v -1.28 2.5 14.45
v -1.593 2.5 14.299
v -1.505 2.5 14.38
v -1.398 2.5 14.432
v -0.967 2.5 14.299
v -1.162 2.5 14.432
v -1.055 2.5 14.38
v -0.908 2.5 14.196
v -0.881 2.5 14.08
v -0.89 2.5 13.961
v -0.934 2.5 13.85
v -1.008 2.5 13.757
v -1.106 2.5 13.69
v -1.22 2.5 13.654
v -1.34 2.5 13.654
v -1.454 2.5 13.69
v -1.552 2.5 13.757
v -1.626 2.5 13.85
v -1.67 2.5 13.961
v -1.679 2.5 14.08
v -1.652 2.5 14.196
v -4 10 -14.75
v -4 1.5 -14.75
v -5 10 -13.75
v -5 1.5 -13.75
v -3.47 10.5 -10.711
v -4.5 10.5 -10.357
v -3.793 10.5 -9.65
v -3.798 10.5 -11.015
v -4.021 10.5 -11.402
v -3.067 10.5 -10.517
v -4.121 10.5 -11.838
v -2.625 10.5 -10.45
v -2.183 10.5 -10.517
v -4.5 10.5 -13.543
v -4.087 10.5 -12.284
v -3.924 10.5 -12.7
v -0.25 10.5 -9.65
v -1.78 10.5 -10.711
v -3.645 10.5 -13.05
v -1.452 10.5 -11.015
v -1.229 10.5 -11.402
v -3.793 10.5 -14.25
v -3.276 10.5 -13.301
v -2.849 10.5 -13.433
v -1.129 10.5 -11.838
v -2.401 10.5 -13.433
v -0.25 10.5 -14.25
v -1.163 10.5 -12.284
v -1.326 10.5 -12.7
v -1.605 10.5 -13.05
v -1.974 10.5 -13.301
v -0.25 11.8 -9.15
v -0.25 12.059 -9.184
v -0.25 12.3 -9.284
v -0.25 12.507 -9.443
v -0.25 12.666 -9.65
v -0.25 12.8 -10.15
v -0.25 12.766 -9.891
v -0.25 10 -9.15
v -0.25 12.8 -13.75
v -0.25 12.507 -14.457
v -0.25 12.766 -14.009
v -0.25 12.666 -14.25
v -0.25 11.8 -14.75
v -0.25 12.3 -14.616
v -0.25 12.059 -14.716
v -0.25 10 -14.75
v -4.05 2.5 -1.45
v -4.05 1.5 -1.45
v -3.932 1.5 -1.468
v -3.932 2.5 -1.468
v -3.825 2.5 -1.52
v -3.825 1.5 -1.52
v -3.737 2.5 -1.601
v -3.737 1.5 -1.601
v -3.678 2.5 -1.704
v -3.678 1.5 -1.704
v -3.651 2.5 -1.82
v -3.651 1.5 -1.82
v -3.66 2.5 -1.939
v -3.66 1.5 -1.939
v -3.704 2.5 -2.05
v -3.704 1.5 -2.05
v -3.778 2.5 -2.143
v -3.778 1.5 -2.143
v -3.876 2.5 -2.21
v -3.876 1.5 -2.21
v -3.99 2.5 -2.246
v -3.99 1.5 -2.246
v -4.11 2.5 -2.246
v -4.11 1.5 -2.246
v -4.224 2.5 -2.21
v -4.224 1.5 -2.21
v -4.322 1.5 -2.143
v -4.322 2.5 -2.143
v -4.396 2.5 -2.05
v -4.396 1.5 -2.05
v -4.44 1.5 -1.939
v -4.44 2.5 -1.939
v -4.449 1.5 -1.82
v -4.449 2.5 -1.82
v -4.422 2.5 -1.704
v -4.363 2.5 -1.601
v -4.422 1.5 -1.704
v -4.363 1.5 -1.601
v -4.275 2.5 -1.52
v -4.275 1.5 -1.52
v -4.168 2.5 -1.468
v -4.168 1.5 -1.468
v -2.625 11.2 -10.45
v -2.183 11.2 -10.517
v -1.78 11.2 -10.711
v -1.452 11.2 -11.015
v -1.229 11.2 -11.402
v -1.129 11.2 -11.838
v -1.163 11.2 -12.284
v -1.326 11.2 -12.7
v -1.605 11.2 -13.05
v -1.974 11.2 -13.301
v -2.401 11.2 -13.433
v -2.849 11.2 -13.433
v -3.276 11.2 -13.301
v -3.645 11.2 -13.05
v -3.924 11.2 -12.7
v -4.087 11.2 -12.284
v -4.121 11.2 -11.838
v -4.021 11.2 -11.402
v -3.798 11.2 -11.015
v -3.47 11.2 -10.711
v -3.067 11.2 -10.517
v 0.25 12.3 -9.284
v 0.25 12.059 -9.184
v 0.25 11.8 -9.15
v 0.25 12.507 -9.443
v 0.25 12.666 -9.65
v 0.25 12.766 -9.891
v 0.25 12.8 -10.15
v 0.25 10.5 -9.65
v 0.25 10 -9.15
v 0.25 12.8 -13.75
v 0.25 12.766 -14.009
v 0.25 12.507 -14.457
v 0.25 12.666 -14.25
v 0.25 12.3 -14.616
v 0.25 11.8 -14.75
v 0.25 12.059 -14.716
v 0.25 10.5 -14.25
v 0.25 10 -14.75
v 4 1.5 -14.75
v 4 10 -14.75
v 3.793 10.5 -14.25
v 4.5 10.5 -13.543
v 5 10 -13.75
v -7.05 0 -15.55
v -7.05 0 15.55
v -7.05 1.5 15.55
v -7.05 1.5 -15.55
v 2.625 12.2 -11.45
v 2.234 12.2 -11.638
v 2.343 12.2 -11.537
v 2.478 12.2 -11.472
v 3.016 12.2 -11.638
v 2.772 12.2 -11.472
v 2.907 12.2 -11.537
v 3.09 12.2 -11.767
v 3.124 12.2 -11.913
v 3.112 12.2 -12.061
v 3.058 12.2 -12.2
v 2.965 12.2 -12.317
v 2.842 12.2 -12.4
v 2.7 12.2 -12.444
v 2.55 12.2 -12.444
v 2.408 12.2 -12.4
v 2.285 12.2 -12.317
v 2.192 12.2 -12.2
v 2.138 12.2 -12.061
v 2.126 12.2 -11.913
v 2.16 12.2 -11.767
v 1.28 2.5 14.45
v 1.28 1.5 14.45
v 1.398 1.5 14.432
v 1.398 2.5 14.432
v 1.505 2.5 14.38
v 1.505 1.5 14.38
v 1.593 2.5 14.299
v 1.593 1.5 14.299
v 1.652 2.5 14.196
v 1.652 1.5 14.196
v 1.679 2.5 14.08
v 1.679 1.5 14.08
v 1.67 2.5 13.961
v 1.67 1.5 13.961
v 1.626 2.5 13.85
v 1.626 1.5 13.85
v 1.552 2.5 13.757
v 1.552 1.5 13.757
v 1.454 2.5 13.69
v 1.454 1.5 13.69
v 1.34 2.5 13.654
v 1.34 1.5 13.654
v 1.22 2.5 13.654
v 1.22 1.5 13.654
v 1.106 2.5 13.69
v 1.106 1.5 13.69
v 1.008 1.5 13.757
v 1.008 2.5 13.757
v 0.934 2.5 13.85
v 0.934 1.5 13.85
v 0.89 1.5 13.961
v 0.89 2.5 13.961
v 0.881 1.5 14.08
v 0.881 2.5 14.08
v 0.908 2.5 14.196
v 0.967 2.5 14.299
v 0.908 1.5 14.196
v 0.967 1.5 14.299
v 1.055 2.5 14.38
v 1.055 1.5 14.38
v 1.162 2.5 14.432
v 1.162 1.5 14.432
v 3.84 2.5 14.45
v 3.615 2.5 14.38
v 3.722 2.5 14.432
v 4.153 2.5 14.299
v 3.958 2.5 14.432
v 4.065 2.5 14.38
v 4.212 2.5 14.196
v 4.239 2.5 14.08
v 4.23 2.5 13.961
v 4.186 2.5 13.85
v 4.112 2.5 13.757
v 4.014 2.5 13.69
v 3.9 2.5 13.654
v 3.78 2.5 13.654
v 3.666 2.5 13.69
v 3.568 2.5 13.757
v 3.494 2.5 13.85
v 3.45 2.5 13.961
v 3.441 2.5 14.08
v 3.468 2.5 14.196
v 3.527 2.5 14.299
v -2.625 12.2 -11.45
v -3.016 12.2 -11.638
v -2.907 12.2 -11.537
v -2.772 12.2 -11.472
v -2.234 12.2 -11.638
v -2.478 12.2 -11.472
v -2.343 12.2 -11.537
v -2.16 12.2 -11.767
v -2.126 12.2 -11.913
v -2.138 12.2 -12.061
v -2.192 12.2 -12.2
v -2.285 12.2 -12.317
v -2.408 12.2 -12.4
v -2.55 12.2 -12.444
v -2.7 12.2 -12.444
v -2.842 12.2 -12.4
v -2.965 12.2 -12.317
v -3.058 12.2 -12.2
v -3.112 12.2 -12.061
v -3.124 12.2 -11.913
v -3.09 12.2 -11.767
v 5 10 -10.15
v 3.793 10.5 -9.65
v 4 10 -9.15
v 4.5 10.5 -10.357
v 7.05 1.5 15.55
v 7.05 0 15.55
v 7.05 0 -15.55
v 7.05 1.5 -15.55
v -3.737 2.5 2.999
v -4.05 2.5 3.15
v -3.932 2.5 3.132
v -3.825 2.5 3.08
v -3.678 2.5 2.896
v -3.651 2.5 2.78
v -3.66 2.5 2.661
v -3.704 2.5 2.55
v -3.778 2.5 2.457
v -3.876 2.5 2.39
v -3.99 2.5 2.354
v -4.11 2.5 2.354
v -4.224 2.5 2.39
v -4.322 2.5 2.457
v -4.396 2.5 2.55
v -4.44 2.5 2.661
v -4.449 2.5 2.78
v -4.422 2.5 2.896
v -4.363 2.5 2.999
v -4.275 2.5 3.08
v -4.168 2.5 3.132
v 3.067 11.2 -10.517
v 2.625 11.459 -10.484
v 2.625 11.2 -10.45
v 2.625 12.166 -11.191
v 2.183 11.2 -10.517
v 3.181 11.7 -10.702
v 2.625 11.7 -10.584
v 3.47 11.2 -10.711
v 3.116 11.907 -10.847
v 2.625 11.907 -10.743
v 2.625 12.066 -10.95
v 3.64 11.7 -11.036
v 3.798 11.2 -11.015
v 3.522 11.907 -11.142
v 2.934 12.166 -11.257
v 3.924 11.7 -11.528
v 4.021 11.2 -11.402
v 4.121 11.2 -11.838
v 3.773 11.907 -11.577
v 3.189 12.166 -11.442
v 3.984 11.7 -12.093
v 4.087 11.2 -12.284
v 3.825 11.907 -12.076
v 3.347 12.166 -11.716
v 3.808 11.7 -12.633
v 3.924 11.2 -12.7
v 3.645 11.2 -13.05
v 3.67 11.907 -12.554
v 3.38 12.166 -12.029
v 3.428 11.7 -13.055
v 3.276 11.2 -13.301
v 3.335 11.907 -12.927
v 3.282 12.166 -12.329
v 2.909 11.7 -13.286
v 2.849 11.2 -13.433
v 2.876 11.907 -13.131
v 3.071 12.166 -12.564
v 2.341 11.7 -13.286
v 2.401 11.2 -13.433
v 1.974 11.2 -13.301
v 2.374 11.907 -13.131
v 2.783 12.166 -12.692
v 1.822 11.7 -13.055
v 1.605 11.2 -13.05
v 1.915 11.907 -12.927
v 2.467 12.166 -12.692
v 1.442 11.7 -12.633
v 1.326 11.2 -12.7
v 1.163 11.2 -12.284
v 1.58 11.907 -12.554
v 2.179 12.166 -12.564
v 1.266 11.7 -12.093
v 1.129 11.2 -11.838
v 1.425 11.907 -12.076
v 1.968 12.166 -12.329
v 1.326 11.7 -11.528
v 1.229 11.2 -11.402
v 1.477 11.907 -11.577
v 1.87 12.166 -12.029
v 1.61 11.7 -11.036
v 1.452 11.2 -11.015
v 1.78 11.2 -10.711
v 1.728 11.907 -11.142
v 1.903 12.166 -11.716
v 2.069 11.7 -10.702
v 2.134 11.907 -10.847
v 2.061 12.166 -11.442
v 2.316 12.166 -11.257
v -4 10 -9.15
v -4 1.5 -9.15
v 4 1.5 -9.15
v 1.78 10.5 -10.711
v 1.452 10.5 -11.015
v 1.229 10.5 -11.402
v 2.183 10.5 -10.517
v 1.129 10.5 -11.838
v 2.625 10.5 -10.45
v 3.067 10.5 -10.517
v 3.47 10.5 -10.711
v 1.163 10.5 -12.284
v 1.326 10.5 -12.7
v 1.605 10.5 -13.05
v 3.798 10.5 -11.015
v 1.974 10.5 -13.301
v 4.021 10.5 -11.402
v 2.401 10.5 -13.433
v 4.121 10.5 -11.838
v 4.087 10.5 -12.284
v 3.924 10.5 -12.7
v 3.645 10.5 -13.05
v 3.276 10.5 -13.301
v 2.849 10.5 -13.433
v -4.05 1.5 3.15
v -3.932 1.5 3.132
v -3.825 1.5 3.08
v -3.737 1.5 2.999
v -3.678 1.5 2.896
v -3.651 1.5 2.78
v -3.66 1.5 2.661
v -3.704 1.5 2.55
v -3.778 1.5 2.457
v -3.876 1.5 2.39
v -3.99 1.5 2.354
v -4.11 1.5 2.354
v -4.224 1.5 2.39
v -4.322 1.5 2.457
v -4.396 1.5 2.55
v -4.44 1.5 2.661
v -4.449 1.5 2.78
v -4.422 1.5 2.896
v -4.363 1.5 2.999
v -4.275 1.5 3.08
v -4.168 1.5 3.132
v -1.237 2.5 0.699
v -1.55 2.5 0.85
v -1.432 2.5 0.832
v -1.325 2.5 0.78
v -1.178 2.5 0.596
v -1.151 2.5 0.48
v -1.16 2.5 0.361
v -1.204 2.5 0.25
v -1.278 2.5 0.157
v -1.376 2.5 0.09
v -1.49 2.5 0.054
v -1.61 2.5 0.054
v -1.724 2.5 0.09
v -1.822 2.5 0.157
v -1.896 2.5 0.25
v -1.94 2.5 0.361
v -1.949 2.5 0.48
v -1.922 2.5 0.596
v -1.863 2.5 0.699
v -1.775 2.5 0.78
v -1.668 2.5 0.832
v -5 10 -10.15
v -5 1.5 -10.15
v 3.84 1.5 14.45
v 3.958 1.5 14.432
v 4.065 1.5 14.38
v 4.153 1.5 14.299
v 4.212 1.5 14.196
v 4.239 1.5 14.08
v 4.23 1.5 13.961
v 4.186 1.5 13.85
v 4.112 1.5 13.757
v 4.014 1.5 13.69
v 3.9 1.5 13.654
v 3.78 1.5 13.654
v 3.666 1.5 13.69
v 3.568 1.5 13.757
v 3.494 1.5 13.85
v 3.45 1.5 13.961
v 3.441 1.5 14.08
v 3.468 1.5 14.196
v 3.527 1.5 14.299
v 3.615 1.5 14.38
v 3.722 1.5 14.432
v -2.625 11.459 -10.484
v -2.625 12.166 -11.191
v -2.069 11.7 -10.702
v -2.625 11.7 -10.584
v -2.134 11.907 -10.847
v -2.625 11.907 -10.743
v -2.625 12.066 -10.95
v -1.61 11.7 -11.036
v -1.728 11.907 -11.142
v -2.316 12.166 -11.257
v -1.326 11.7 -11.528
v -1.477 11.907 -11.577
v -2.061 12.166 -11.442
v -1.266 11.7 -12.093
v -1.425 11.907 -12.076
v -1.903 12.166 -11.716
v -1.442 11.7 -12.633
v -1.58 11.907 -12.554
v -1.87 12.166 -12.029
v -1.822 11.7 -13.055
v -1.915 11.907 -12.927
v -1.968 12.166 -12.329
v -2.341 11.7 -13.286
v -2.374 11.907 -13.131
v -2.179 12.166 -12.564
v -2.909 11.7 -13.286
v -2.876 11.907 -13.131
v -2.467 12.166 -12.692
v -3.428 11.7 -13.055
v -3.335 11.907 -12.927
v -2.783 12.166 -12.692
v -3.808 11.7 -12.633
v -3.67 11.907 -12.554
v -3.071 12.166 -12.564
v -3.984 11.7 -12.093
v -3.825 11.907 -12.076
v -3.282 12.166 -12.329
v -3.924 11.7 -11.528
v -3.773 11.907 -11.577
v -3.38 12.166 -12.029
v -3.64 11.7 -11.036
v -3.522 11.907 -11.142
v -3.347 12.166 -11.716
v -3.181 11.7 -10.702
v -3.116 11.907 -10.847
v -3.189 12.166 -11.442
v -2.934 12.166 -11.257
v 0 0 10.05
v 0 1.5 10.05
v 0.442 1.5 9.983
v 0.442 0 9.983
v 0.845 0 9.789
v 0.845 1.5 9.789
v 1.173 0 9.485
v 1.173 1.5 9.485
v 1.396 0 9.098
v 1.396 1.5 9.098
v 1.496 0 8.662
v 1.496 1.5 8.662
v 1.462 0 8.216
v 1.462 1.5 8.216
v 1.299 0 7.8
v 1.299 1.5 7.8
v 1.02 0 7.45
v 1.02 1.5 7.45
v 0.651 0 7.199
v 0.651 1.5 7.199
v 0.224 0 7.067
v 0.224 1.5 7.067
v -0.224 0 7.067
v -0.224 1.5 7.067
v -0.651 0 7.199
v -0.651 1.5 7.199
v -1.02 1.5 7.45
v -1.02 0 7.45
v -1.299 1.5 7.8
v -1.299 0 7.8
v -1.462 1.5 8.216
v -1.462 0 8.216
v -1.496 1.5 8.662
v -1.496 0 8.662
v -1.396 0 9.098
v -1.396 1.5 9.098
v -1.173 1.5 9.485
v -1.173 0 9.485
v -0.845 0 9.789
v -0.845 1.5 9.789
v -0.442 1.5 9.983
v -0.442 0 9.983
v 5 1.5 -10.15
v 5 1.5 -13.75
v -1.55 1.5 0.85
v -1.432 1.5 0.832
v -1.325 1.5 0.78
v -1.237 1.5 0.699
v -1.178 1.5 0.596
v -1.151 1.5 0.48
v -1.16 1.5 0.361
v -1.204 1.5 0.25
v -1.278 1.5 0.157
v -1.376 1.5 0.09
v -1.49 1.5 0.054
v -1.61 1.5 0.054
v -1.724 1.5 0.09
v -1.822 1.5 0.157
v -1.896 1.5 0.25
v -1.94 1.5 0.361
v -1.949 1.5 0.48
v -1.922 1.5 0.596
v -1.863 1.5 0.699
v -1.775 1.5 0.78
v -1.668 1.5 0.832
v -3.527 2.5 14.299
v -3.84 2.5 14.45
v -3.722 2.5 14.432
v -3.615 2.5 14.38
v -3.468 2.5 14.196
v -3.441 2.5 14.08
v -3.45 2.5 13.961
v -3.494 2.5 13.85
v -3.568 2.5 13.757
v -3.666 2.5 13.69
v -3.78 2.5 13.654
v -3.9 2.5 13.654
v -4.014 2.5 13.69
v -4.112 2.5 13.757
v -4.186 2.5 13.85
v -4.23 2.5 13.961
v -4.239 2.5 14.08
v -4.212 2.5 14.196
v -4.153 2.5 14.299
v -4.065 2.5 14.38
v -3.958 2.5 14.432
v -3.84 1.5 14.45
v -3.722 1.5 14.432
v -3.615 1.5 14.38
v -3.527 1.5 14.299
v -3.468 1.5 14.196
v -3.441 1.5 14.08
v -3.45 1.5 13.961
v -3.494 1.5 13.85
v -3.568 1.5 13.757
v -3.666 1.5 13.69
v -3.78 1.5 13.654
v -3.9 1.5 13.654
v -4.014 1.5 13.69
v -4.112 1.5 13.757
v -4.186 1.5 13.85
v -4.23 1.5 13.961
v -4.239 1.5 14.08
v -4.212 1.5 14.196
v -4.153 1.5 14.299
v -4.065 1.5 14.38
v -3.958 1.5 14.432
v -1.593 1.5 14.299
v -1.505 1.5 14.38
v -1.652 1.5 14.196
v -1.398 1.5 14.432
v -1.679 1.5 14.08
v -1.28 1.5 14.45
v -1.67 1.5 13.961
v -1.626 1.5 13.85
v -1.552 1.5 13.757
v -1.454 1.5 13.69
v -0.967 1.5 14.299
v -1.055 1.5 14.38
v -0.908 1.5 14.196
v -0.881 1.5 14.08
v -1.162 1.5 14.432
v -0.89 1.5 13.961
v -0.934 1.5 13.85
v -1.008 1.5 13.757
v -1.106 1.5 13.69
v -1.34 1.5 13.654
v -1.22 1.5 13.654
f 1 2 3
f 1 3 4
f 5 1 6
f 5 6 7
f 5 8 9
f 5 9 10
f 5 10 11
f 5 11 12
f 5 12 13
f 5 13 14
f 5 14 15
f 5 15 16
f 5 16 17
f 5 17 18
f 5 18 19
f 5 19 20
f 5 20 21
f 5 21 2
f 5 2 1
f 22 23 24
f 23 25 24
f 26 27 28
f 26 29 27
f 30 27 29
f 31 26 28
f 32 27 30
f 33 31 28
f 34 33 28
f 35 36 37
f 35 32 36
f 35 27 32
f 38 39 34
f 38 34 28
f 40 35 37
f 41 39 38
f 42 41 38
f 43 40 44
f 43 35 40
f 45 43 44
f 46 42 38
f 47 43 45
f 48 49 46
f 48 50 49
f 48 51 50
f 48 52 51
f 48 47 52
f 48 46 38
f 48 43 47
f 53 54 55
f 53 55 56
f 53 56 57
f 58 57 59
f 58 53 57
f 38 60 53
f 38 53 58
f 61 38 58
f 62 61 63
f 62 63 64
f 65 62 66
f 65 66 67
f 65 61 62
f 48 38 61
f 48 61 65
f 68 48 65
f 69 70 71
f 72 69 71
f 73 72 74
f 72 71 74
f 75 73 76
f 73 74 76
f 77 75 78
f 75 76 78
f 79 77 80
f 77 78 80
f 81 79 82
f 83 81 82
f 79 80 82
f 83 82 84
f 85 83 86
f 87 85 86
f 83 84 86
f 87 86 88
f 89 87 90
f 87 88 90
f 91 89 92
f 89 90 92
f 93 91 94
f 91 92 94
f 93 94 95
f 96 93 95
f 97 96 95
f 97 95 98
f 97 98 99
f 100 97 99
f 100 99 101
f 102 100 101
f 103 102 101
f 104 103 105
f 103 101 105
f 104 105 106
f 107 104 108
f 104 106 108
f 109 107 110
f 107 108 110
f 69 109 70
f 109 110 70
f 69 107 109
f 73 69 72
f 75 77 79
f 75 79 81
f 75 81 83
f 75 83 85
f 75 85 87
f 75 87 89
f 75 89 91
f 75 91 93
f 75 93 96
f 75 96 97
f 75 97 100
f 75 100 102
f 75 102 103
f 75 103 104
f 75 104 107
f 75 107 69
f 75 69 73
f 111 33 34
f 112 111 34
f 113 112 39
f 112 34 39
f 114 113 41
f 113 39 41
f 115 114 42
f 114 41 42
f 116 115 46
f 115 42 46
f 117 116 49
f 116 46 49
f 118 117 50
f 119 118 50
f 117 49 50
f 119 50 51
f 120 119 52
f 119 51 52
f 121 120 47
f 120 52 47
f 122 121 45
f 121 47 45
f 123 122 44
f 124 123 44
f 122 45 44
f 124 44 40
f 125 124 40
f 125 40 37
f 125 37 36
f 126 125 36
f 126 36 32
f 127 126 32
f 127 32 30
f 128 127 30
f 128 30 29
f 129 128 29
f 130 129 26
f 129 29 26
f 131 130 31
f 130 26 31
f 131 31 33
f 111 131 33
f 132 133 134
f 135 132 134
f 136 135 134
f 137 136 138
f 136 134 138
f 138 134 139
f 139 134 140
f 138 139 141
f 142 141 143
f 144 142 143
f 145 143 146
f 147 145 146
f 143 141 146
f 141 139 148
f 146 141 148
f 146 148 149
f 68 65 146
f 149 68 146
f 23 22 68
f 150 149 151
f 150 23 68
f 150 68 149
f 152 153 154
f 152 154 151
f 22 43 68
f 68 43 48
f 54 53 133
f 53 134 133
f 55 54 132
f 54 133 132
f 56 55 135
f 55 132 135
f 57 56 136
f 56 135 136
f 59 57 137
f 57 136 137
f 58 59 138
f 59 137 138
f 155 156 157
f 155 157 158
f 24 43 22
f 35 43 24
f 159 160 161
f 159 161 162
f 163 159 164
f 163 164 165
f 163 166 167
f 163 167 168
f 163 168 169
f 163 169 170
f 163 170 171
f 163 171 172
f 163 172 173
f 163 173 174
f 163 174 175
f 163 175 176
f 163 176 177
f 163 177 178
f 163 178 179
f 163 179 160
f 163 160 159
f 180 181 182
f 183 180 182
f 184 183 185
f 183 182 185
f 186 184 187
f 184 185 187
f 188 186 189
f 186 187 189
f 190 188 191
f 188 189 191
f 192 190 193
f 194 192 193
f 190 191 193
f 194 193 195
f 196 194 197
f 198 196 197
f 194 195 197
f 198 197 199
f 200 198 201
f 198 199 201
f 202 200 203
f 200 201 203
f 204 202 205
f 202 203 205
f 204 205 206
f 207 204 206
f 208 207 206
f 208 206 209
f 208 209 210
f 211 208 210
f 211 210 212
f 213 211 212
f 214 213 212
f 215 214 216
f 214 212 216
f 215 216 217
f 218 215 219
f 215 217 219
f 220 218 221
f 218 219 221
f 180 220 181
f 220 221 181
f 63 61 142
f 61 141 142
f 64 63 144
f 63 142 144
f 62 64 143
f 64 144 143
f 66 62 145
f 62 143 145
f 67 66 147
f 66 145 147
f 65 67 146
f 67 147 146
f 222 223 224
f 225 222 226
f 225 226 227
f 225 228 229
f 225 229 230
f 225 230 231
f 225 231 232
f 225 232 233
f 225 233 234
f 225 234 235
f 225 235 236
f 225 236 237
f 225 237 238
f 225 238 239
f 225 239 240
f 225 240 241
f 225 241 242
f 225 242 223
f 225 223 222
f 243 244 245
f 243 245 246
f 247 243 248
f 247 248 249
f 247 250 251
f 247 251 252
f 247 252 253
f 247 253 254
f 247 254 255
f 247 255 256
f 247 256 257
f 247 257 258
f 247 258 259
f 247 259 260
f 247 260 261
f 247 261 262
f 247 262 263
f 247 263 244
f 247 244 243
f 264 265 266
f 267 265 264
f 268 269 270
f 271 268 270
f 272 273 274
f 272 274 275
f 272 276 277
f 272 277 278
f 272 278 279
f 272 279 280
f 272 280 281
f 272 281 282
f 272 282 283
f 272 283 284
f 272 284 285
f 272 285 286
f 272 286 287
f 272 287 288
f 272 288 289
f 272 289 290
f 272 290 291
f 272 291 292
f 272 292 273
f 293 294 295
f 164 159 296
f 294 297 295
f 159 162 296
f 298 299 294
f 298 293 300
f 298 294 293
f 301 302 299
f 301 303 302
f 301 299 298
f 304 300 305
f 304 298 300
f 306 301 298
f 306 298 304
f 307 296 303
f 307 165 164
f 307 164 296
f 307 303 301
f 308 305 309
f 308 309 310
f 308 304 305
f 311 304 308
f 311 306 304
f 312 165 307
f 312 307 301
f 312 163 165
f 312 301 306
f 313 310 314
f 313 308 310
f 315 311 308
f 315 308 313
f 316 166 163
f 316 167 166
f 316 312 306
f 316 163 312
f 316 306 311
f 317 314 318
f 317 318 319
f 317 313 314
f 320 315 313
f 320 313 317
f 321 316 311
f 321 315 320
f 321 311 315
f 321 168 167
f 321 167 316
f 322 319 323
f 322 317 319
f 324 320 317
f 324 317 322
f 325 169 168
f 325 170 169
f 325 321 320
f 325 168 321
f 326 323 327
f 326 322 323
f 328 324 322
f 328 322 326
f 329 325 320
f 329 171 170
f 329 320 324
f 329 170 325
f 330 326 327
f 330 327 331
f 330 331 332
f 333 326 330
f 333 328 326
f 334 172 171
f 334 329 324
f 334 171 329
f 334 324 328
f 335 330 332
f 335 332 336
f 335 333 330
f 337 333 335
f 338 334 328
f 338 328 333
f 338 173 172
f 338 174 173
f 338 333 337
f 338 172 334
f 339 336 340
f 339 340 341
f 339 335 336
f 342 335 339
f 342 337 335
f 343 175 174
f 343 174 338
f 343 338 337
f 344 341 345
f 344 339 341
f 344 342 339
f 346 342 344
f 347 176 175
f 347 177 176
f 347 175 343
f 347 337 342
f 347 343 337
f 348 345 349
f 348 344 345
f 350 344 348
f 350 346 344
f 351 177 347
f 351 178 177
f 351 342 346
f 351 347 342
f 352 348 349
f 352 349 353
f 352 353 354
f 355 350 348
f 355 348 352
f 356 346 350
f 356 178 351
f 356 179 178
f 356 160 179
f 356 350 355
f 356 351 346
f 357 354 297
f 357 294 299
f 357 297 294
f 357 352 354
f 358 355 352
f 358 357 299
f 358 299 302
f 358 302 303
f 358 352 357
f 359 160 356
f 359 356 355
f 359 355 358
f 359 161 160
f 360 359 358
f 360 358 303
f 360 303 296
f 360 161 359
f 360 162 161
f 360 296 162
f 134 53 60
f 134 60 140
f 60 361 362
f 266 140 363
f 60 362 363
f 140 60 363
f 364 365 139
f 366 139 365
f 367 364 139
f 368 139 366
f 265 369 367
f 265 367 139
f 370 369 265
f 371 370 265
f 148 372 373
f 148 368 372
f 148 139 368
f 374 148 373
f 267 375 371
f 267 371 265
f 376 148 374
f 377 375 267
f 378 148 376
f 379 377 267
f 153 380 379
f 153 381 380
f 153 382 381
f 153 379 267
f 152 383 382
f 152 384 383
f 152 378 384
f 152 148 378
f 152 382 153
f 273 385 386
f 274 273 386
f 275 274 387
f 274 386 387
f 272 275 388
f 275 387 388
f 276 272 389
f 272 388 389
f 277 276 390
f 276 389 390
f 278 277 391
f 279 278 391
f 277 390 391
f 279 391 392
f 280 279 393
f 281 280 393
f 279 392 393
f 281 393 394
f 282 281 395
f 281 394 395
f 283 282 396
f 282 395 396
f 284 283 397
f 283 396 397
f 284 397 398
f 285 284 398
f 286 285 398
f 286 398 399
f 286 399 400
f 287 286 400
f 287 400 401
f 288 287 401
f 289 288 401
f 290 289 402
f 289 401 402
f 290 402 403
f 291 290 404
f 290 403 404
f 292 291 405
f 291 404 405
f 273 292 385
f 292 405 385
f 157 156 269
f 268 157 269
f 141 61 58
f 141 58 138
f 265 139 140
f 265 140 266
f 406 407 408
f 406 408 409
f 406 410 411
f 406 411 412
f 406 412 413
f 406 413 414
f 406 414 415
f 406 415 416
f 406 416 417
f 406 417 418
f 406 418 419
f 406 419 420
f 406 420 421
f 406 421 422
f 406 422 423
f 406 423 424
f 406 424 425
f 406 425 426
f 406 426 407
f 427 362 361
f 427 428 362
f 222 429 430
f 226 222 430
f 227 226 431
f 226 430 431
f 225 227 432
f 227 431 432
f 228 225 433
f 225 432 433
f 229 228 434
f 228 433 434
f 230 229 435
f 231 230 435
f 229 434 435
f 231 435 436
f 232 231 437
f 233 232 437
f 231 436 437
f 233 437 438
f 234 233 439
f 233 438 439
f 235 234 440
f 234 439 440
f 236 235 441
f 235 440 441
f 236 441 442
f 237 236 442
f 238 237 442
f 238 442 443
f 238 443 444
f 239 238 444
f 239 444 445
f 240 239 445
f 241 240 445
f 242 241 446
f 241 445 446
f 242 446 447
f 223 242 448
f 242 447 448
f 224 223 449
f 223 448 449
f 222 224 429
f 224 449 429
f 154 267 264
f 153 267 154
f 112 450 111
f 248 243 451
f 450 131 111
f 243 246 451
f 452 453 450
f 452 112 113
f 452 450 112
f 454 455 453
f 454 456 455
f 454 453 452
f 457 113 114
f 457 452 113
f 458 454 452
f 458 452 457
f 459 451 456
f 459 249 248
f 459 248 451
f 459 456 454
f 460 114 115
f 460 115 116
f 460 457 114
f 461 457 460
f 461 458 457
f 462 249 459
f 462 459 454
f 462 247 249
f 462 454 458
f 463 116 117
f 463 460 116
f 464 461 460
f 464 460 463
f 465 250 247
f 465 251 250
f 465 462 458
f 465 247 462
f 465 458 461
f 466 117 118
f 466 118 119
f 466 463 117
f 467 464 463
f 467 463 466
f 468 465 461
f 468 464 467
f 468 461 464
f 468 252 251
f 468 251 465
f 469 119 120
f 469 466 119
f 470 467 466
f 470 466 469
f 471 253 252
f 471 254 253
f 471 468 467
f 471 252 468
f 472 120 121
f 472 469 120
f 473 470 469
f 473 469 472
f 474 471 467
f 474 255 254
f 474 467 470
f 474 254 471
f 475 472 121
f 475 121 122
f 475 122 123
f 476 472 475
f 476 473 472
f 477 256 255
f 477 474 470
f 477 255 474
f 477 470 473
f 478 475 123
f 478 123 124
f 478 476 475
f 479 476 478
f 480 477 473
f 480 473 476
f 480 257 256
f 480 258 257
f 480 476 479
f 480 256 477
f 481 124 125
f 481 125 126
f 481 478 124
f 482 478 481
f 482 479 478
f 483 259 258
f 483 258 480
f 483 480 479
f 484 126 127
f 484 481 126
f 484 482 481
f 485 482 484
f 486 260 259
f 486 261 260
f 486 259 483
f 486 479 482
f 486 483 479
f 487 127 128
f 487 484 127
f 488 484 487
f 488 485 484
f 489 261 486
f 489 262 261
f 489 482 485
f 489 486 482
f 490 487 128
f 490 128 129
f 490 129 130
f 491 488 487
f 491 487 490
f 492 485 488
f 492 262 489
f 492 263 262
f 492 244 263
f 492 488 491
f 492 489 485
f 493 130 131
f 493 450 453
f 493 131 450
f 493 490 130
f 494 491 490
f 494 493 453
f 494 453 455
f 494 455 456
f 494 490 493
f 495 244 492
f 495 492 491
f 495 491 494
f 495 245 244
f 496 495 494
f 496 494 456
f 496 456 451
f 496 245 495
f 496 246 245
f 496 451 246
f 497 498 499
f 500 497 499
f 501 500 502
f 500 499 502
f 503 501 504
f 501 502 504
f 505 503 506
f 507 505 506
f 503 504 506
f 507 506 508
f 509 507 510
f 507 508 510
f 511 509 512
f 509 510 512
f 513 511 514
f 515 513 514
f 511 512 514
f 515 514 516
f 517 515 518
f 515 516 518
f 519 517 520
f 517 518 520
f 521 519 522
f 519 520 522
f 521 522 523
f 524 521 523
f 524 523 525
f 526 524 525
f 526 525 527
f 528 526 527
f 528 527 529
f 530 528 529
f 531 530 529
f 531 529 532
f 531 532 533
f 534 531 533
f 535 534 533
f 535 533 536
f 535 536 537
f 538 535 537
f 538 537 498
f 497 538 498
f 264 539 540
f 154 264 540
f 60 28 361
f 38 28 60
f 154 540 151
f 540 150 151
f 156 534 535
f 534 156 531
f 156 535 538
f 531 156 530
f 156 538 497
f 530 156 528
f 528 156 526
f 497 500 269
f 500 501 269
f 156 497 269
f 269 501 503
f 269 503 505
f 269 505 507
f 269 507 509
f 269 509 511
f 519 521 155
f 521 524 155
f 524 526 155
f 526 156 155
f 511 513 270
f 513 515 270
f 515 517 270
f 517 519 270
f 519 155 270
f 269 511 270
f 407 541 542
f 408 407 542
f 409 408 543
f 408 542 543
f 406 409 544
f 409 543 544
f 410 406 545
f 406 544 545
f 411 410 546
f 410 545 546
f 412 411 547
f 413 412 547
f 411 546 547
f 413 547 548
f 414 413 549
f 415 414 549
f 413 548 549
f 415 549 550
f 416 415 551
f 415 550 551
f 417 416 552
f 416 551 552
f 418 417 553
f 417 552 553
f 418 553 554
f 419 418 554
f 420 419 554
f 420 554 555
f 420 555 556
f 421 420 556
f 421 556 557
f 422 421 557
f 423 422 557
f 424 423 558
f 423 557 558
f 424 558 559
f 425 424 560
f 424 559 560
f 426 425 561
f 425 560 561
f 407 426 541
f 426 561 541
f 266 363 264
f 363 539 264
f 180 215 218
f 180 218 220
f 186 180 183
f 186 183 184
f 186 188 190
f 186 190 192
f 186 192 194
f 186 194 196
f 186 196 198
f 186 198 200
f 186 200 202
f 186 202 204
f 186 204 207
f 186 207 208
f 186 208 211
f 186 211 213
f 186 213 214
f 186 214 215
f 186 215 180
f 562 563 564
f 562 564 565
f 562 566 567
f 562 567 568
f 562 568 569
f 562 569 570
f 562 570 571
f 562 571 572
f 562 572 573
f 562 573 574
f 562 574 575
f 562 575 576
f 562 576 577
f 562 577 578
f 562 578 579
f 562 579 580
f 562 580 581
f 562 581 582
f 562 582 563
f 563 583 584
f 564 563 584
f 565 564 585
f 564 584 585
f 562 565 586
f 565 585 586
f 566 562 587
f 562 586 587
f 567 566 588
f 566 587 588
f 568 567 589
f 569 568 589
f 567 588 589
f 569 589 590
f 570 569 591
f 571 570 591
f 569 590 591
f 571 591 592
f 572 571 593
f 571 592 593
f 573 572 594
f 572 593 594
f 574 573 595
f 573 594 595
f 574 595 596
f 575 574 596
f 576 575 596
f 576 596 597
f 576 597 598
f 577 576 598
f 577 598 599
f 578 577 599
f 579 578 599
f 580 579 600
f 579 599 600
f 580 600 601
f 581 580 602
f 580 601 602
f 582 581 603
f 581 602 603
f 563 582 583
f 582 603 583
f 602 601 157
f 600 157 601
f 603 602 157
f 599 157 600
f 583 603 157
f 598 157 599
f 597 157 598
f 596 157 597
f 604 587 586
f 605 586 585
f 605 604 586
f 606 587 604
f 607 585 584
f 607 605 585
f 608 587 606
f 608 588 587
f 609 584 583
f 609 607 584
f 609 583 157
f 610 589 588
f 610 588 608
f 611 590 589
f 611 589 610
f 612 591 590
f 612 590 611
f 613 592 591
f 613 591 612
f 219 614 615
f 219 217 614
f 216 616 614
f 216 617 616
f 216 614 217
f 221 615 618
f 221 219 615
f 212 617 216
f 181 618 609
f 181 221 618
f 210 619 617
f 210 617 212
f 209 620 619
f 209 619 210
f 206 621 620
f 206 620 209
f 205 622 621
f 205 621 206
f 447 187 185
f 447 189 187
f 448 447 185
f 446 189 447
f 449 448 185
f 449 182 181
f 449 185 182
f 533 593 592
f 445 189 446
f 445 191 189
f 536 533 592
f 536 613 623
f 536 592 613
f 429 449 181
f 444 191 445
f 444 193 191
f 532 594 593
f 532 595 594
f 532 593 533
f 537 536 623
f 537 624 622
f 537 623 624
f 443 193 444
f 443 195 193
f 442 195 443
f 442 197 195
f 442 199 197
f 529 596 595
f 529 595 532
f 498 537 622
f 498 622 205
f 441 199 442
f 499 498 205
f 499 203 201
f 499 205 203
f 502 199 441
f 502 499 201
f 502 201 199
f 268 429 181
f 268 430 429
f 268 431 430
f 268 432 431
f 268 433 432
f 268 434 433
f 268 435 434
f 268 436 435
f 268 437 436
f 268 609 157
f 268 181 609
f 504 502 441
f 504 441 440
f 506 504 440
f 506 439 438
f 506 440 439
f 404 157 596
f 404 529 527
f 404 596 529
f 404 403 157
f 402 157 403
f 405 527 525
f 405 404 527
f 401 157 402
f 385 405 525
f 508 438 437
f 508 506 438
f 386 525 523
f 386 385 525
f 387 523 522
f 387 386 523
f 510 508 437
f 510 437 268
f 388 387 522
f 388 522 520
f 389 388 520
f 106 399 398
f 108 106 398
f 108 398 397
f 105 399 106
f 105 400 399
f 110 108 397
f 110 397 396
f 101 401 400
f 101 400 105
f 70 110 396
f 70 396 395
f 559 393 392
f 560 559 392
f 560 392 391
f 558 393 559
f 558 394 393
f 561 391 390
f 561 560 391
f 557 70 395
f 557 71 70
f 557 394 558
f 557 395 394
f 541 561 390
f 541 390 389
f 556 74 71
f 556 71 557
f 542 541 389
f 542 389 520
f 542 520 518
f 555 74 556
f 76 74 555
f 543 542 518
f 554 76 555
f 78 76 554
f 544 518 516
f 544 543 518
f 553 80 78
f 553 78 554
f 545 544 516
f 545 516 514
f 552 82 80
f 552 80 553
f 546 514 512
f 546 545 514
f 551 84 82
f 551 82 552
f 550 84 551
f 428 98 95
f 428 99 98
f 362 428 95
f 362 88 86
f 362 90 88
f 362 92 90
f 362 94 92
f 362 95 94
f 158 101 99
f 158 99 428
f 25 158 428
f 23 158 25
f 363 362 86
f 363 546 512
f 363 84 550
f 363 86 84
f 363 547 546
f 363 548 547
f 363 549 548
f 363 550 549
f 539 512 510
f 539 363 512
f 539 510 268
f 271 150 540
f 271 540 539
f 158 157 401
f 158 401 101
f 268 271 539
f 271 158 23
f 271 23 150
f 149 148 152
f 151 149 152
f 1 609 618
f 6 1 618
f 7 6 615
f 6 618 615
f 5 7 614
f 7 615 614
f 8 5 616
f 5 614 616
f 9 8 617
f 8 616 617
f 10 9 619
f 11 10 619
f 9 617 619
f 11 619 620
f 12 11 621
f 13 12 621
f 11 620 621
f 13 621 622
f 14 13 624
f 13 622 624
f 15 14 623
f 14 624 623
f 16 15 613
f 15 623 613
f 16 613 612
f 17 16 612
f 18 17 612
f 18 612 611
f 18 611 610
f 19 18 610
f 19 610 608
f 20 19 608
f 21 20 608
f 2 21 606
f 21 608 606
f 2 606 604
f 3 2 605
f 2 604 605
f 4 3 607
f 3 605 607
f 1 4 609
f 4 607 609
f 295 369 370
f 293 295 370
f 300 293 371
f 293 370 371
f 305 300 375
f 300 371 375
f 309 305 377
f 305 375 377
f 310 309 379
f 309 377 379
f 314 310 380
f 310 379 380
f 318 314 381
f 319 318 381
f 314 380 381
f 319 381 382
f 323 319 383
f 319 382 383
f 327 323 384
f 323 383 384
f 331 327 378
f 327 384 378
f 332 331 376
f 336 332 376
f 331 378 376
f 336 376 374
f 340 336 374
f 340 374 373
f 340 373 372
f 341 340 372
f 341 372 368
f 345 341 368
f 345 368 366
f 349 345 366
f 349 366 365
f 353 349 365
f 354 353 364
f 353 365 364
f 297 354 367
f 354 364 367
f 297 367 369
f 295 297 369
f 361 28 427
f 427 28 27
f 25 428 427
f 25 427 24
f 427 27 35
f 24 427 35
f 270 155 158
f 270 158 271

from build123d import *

# Parameters (mm, degrees)
SKETCH1_W           = 14.1
SKETCH1_H           = 31.1
BOSS_EXTRUDE1_DEPTH = 1.5
SKETCH2_W           = 10
SKETCH2_H           = 5.6
BOSS_EXTRUDE2_DEPTH = 9
SKETCH3_W           = 0.5
SKETCH3_H           = 5.6
BOSS_EXTRUDE3_DEPTH = 2.3
SKETCH4_R           = 1.5
BOSS_EXTRUDE4_DEPTH = 1.7
CHAMFER1_SIZE       = 1
CHAMFER2_SIZE       = 0.5
FILLET1_R           = 1
FILLET2_R           = 1
SKETCH5_R           = 0.4
BOSS_EXTRUDE5_DEPTH = 1
SKETCH6_R           = 1.5
CUT_EXTRUDE1_DEPTH  = 11


with BuildPart() as part:
    # Sketch1 → Boss-Extrude1 (new body)
    with BuildSketch(Plane(origin=(0, 0, 0), x_dir=(1, 0, 0), z_dir=(0, 1, 0))):
        Rectangle(SKETCH1_W, SKETCH1_H)
    extrude(amount=BOSS_EXTRUDE1_DEPTH)

    # Sketch2 → Boss-Extrude2 (add)
    with BuildSketch(Plane(origin=(0, 1.5, 0), x_dir=(1, 0, 0), z_dir=(0, 1, 0))):
        with Locations((0, 11.95)):
            Rectangle(SKETCH2_W, SKETCH2_H)
    extrude(amount=BOSS_EXTRUDE2_DEPTH)

    # Sketch3 → Boss-Extrude3 (add)
    with BuildSketch(Plane(origin=(0, 10.5, 0), x_dir=(1, 0, 0), z_dir=(0, 1, 0))):
        with Locations((0, 11.95)):
            Rectangle(SKETCH3_W, SKETCH3_H)
    extrude(amount=BOSS_EXTRUDE3_DEPTH)

    # Sketch4 → Boss-Extrude4 (add)
    with BuildSketch(Plane(origin=(0, 10.5, 0), x_dir=(1, 0, 0), z_dir=(0, 1, 0))):
        with Locations(Location((-2.625, 11.95, 0), (0, 0, 270))):
            Circle(SKETCH4_R)
        with Locations(Location((2.625, 11.95, 0), (0, 0, 270))):
            Circle(SKETCH4_R)
    extrude(amount=BOSS_EXTRUDE4_DEPTH)

    # Chamfer1
    chamfer1_edges = [part.edges().sort_by_distance(p)[0] for p in [
        (5, 6, -9.15),
        (5, 6, -14.75),
        (-5, 6, -14.75),
        (-5, 6, -9.15),
    ]]
    chamfer(chamfer1_edges, length=CHAMFER1_SIZE)

    # Chamfer2
    chamfer2_edges = [part.edges().sort_by_distance(p)[0] for p in [
        (-2.125, 10.5, -14.75),
        (2.125, 10.5, -9.15),
        (-5, 10.5, -11.95),
        (2.125, 10.5, -14.75),
        (-2.125, 10.5, -9.15),
        (-4.5, 10.5, -9.65),
        (-4.5, 10.5, -14.25),
        (5, 10.5, -11.95),
        (4.5, 10.5, -14.25),
        (4.5, 10.5, -9.65),
    ]]
    chamfer(chamfer2_edges, length=CHAMFER2_SIZE)

    # Fillet1
    fillet1_edges = [part.edges().sort_by_distance(p)[0] for p in [
        (-2.625, 12.2, -13.45),
        (2.625, 12.2, -13.45),
    ]]
    fillet(fillet1_edges, radius=FILLET1_R)

    # Fillet2
    fillet2_edges = [part.edges().sort_by_distance(p)[0] for p in [
        (0, 12.8, -14.75),
        (0, 12.8, -9.15),
    ]]
    fillet(fillet2_edges, radius=FILLET2_R)

    # Sketch5 → Boss-Extrude5 (add)
    with BuildSketch(Plane(origin=(0, 1.5, 0), x_dir=(1, 0, 0), z_dir=(0, 1, 0))):
        with Locations(Location((-4.05, 1.85, 0), (0, 0, 270))):
            Circle(SKETCH5_R)
        with Locations(Location((-1.55, -0.45, 0), (0, 0, 270))):
            Circle(SKETCH5_R)
        with Locations(Location((-4.05, -2.75, 0), (0, 0, 270))):
            Circle(SKETCH5_R)
        with Locations(Location((-3.84, -14.05, 0), (0, 0, 270))):
            Circle(SKETCH5_R)
        with Locations(Location((-1.28, -14.05, 0), (0, 0, 270))):
            Circle(SKETCH5_R)
        with Locations(Location((1.28, -14.05, 0), (0, 0, 270))):
            Circle(SKETCH5_R)
        with Locations(Location((3.84, -14.05, 0), (0, 0, 270))):
            Circle(SKETCH5_R)
    extrude(amount=BOSS_EXTRUDE5_DEPTH)

    # Sketch6 → Cut-Extrude1 (cut)
    with BuildSketch(Plane(origin=(0, 1.5, 0), x_dir=(1, 0, 0), z_dir=(0, 1, 0))):
        with Locations(Location((0, -8.55, 0), (0, 0, 270))):
            Circle(SKETCH6_R)
    extrude(amount=-CUT_EXTRUDE1_DEPTH, mode=Mode.SUBTRACT)


solid = part.part
